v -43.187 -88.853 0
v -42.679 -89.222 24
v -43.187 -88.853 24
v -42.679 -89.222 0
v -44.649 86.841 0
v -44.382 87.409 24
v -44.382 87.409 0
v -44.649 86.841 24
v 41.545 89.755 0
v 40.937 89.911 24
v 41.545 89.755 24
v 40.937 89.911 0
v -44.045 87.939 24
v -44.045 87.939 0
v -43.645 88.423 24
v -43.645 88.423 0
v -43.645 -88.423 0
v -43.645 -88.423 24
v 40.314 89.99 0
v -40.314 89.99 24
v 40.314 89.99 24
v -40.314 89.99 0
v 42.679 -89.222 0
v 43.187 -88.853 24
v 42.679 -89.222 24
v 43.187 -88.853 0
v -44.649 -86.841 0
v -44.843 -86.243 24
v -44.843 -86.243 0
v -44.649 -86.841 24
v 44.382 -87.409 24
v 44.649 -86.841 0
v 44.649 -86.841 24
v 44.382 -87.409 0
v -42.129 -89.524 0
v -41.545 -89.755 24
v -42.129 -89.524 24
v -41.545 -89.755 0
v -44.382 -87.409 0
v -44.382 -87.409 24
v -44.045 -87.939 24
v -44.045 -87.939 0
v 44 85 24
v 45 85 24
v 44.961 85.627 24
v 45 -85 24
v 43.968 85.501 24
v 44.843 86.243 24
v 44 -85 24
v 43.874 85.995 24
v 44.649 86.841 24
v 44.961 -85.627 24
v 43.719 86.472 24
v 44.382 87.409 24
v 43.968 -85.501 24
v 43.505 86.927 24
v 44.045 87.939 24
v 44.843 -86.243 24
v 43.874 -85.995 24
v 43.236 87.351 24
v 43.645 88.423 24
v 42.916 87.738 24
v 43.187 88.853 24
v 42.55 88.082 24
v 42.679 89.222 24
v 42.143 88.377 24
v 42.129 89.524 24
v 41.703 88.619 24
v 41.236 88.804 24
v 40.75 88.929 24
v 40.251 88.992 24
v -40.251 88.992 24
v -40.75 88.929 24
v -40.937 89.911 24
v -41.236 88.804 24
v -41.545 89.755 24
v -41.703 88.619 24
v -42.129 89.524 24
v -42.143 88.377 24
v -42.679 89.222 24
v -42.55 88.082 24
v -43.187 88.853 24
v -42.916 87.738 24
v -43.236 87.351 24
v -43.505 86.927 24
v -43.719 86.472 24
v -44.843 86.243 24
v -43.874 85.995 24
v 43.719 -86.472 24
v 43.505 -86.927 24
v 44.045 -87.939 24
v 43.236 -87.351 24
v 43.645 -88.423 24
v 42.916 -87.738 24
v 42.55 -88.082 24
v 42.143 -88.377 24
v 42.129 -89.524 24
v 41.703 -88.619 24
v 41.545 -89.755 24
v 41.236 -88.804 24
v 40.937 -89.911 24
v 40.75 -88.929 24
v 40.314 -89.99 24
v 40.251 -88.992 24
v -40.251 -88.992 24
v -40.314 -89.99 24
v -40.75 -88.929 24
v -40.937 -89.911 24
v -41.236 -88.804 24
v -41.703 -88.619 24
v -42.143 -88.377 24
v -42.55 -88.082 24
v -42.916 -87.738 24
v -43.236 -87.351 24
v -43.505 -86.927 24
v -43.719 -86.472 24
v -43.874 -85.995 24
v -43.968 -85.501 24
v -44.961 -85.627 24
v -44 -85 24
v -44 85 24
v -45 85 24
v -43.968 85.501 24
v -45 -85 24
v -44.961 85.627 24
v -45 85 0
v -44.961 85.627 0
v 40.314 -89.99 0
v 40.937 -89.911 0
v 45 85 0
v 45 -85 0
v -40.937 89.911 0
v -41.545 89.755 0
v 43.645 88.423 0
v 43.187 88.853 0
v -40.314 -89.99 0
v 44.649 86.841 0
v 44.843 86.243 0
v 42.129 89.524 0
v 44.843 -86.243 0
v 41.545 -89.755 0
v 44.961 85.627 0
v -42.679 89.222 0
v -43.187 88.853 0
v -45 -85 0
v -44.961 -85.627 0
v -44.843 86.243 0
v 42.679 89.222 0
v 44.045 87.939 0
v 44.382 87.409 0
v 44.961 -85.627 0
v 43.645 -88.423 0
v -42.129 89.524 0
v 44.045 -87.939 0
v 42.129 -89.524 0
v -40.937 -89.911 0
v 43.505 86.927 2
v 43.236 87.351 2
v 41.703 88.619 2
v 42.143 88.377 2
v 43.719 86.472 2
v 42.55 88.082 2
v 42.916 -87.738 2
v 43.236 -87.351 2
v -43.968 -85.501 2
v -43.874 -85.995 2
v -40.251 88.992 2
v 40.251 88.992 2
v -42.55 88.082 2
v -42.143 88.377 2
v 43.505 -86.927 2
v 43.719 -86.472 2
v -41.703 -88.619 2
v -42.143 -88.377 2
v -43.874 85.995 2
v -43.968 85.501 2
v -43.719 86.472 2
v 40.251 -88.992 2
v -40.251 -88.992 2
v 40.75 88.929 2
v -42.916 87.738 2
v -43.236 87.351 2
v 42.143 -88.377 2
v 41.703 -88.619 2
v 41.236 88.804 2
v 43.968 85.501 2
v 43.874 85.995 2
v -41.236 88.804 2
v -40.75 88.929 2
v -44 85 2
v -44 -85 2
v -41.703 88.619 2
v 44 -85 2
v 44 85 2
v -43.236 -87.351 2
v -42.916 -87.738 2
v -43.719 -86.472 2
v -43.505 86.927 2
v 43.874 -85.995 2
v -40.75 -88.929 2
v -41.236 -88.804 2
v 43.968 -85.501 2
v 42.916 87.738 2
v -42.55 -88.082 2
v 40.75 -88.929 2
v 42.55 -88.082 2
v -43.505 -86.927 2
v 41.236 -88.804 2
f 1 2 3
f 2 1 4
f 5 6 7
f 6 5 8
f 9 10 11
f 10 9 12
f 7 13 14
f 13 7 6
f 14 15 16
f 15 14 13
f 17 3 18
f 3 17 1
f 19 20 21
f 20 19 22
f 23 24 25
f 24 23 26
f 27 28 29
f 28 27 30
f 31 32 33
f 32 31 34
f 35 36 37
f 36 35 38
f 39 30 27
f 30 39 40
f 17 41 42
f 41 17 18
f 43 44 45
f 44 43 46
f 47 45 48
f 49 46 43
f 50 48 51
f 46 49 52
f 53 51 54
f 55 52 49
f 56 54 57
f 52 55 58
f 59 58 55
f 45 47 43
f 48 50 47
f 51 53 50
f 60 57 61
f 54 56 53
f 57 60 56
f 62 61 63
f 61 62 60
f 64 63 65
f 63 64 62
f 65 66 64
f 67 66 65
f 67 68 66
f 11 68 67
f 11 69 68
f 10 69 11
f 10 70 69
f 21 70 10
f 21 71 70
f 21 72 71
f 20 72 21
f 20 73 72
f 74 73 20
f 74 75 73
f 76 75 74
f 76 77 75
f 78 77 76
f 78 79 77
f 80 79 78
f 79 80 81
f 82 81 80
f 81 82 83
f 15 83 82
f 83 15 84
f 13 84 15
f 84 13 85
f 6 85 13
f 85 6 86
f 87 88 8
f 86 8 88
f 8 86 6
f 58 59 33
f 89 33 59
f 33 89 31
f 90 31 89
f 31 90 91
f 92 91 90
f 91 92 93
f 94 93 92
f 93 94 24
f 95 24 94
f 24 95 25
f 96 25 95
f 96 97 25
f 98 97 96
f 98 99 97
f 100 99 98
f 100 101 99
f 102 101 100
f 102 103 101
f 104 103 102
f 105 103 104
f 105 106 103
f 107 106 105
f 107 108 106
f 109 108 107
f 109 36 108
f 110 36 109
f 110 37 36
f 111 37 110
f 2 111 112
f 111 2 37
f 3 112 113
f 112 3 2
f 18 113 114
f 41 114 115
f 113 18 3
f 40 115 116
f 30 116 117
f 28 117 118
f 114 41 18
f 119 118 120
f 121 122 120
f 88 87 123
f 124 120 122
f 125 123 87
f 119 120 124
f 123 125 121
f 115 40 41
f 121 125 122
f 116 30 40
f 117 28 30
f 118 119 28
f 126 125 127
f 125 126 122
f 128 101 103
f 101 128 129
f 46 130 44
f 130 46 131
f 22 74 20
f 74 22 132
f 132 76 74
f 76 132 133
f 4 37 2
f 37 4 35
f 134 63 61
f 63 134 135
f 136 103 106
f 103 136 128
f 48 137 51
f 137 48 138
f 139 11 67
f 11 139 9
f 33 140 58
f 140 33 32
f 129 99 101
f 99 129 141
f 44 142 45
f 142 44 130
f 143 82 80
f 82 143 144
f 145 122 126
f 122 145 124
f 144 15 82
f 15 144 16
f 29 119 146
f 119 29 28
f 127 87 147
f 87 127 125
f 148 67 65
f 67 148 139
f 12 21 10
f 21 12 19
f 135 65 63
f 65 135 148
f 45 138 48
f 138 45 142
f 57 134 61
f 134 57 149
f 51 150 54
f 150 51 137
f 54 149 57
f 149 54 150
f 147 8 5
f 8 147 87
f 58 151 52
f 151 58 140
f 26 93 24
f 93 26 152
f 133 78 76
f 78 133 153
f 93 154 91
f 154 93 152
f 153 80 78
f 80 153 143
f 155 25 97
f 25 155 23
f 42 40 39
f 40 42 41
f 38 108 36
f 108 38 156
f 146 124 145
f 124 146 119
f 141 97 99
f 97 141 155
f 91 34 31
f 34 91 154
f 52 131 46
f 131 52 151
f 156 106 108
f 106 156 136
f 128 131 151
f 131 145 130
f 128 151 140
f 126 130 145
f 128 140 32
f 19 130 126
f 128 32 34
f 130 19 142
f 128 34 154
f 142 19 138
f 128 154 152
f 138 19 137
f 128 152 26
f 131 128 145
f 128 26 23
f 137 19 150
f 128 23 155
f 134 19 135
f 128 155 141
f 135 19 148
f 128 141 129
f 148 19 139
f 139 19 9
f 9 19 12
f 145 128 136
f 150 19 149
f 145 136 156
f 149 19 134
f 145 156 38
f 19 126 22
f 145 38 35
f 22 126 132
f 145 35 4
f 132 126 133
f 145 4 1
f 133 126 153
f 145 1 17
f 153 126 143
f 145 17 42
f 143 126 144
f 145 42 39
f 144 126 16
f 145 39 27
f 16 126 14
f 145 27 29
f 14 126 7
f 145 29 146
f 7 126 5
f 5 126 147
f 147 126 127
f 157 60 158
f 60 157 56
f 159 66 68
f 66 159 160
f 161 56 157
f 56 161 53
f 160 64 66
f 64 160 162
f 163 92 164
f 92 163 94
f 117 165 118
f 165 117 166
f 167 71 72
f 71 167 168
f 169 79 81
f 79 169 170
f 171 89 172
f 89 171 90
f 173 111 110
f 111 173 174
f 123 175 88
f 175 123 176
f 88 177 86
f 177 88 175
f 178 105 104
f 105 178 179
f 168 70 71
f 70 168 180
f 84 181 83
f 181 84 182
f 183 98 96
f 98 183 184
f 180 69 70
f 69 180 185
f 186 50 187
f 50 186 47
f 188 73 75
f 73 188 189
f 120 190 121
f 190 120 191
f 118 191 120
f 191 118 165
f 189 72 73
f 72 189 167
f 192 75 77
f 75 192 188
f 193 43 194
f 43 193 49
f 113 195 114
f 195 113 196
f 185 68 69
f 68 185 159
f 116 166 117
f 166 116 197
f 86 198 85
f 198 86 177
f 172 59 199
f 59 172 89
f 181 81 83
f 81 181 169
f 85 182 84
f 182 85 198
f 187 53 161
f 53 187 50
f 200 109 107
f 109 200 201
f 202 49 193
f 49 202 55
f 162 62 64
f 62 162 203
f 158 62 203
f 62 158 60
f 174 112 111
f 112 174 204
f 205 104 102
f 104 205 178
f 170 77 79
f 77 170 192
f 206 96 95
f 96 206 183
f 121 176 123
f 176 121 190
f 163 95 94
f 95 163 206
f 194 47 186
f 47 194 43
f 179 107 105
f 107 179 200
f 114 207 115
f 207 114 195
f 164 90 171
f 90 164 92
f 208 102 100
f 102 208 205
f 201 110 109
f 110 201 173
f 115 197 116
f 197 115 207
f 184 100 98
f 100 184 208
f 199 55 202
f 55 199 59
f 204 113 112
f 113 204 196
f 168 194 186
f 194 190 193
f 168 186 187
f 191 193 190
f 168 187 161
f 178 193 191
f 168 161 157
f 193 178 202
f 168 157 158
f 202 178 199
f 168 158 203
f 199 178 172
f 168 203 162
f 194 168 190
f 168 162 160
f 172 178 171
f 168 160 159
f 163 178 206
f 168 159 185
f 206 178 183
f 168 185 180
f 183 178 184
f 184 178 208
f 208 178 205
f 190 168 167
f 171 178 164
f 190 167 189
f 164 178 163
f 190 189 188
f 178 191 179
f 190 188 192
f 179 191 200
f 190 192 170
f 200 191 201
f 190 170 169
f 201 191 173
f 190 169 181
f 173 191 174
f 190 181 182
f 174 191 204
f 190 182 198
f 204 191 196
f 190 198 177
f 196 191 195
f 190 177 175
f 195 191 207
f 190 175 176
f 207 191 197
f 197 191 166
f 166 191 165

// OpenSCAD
$fn = 50;


difference() {
	union() {
		hull() {
			translate(v = [-40.0000000000, 85.0000000000, 0]) {
				cylinder(h = 24, r = 5);
			}
			translate(v = [40.0000000000, 85.0000000000, 0]) {
				cylinder(h = 24, r = 5);
			}
			translate(v = [-40.0000000000, -85.0000000000, 0]) {
				cylinder(h = 24, r = 5);
			}
			translate(v = [40.0000000000, -85.0000000000, 0]) {
				cylinder(h = 24, r = 5);
			}
		}
	}
	union() {
		translate(v = [0, 0, 2]) {
			hull() {
				translate(v = [-40.0000000000, 85.0000000000, 0]) {
					cylinder(h = 22, r = 4);
				}
				translate(v = [40.0000000000, 85.0000000000, 0]) {
					cylinder(h = 22, r = 4);
				}
				translate(v = [-40.0000000000, -85.0000000000, 0]) {
					cylinder(h = 22, r = 4);
				}
				translate(v = [40.0000000000, -85.0000000000, 0]) {
					cylinder(h = 22, r = 4);
				}
			}
		}
	}
}
